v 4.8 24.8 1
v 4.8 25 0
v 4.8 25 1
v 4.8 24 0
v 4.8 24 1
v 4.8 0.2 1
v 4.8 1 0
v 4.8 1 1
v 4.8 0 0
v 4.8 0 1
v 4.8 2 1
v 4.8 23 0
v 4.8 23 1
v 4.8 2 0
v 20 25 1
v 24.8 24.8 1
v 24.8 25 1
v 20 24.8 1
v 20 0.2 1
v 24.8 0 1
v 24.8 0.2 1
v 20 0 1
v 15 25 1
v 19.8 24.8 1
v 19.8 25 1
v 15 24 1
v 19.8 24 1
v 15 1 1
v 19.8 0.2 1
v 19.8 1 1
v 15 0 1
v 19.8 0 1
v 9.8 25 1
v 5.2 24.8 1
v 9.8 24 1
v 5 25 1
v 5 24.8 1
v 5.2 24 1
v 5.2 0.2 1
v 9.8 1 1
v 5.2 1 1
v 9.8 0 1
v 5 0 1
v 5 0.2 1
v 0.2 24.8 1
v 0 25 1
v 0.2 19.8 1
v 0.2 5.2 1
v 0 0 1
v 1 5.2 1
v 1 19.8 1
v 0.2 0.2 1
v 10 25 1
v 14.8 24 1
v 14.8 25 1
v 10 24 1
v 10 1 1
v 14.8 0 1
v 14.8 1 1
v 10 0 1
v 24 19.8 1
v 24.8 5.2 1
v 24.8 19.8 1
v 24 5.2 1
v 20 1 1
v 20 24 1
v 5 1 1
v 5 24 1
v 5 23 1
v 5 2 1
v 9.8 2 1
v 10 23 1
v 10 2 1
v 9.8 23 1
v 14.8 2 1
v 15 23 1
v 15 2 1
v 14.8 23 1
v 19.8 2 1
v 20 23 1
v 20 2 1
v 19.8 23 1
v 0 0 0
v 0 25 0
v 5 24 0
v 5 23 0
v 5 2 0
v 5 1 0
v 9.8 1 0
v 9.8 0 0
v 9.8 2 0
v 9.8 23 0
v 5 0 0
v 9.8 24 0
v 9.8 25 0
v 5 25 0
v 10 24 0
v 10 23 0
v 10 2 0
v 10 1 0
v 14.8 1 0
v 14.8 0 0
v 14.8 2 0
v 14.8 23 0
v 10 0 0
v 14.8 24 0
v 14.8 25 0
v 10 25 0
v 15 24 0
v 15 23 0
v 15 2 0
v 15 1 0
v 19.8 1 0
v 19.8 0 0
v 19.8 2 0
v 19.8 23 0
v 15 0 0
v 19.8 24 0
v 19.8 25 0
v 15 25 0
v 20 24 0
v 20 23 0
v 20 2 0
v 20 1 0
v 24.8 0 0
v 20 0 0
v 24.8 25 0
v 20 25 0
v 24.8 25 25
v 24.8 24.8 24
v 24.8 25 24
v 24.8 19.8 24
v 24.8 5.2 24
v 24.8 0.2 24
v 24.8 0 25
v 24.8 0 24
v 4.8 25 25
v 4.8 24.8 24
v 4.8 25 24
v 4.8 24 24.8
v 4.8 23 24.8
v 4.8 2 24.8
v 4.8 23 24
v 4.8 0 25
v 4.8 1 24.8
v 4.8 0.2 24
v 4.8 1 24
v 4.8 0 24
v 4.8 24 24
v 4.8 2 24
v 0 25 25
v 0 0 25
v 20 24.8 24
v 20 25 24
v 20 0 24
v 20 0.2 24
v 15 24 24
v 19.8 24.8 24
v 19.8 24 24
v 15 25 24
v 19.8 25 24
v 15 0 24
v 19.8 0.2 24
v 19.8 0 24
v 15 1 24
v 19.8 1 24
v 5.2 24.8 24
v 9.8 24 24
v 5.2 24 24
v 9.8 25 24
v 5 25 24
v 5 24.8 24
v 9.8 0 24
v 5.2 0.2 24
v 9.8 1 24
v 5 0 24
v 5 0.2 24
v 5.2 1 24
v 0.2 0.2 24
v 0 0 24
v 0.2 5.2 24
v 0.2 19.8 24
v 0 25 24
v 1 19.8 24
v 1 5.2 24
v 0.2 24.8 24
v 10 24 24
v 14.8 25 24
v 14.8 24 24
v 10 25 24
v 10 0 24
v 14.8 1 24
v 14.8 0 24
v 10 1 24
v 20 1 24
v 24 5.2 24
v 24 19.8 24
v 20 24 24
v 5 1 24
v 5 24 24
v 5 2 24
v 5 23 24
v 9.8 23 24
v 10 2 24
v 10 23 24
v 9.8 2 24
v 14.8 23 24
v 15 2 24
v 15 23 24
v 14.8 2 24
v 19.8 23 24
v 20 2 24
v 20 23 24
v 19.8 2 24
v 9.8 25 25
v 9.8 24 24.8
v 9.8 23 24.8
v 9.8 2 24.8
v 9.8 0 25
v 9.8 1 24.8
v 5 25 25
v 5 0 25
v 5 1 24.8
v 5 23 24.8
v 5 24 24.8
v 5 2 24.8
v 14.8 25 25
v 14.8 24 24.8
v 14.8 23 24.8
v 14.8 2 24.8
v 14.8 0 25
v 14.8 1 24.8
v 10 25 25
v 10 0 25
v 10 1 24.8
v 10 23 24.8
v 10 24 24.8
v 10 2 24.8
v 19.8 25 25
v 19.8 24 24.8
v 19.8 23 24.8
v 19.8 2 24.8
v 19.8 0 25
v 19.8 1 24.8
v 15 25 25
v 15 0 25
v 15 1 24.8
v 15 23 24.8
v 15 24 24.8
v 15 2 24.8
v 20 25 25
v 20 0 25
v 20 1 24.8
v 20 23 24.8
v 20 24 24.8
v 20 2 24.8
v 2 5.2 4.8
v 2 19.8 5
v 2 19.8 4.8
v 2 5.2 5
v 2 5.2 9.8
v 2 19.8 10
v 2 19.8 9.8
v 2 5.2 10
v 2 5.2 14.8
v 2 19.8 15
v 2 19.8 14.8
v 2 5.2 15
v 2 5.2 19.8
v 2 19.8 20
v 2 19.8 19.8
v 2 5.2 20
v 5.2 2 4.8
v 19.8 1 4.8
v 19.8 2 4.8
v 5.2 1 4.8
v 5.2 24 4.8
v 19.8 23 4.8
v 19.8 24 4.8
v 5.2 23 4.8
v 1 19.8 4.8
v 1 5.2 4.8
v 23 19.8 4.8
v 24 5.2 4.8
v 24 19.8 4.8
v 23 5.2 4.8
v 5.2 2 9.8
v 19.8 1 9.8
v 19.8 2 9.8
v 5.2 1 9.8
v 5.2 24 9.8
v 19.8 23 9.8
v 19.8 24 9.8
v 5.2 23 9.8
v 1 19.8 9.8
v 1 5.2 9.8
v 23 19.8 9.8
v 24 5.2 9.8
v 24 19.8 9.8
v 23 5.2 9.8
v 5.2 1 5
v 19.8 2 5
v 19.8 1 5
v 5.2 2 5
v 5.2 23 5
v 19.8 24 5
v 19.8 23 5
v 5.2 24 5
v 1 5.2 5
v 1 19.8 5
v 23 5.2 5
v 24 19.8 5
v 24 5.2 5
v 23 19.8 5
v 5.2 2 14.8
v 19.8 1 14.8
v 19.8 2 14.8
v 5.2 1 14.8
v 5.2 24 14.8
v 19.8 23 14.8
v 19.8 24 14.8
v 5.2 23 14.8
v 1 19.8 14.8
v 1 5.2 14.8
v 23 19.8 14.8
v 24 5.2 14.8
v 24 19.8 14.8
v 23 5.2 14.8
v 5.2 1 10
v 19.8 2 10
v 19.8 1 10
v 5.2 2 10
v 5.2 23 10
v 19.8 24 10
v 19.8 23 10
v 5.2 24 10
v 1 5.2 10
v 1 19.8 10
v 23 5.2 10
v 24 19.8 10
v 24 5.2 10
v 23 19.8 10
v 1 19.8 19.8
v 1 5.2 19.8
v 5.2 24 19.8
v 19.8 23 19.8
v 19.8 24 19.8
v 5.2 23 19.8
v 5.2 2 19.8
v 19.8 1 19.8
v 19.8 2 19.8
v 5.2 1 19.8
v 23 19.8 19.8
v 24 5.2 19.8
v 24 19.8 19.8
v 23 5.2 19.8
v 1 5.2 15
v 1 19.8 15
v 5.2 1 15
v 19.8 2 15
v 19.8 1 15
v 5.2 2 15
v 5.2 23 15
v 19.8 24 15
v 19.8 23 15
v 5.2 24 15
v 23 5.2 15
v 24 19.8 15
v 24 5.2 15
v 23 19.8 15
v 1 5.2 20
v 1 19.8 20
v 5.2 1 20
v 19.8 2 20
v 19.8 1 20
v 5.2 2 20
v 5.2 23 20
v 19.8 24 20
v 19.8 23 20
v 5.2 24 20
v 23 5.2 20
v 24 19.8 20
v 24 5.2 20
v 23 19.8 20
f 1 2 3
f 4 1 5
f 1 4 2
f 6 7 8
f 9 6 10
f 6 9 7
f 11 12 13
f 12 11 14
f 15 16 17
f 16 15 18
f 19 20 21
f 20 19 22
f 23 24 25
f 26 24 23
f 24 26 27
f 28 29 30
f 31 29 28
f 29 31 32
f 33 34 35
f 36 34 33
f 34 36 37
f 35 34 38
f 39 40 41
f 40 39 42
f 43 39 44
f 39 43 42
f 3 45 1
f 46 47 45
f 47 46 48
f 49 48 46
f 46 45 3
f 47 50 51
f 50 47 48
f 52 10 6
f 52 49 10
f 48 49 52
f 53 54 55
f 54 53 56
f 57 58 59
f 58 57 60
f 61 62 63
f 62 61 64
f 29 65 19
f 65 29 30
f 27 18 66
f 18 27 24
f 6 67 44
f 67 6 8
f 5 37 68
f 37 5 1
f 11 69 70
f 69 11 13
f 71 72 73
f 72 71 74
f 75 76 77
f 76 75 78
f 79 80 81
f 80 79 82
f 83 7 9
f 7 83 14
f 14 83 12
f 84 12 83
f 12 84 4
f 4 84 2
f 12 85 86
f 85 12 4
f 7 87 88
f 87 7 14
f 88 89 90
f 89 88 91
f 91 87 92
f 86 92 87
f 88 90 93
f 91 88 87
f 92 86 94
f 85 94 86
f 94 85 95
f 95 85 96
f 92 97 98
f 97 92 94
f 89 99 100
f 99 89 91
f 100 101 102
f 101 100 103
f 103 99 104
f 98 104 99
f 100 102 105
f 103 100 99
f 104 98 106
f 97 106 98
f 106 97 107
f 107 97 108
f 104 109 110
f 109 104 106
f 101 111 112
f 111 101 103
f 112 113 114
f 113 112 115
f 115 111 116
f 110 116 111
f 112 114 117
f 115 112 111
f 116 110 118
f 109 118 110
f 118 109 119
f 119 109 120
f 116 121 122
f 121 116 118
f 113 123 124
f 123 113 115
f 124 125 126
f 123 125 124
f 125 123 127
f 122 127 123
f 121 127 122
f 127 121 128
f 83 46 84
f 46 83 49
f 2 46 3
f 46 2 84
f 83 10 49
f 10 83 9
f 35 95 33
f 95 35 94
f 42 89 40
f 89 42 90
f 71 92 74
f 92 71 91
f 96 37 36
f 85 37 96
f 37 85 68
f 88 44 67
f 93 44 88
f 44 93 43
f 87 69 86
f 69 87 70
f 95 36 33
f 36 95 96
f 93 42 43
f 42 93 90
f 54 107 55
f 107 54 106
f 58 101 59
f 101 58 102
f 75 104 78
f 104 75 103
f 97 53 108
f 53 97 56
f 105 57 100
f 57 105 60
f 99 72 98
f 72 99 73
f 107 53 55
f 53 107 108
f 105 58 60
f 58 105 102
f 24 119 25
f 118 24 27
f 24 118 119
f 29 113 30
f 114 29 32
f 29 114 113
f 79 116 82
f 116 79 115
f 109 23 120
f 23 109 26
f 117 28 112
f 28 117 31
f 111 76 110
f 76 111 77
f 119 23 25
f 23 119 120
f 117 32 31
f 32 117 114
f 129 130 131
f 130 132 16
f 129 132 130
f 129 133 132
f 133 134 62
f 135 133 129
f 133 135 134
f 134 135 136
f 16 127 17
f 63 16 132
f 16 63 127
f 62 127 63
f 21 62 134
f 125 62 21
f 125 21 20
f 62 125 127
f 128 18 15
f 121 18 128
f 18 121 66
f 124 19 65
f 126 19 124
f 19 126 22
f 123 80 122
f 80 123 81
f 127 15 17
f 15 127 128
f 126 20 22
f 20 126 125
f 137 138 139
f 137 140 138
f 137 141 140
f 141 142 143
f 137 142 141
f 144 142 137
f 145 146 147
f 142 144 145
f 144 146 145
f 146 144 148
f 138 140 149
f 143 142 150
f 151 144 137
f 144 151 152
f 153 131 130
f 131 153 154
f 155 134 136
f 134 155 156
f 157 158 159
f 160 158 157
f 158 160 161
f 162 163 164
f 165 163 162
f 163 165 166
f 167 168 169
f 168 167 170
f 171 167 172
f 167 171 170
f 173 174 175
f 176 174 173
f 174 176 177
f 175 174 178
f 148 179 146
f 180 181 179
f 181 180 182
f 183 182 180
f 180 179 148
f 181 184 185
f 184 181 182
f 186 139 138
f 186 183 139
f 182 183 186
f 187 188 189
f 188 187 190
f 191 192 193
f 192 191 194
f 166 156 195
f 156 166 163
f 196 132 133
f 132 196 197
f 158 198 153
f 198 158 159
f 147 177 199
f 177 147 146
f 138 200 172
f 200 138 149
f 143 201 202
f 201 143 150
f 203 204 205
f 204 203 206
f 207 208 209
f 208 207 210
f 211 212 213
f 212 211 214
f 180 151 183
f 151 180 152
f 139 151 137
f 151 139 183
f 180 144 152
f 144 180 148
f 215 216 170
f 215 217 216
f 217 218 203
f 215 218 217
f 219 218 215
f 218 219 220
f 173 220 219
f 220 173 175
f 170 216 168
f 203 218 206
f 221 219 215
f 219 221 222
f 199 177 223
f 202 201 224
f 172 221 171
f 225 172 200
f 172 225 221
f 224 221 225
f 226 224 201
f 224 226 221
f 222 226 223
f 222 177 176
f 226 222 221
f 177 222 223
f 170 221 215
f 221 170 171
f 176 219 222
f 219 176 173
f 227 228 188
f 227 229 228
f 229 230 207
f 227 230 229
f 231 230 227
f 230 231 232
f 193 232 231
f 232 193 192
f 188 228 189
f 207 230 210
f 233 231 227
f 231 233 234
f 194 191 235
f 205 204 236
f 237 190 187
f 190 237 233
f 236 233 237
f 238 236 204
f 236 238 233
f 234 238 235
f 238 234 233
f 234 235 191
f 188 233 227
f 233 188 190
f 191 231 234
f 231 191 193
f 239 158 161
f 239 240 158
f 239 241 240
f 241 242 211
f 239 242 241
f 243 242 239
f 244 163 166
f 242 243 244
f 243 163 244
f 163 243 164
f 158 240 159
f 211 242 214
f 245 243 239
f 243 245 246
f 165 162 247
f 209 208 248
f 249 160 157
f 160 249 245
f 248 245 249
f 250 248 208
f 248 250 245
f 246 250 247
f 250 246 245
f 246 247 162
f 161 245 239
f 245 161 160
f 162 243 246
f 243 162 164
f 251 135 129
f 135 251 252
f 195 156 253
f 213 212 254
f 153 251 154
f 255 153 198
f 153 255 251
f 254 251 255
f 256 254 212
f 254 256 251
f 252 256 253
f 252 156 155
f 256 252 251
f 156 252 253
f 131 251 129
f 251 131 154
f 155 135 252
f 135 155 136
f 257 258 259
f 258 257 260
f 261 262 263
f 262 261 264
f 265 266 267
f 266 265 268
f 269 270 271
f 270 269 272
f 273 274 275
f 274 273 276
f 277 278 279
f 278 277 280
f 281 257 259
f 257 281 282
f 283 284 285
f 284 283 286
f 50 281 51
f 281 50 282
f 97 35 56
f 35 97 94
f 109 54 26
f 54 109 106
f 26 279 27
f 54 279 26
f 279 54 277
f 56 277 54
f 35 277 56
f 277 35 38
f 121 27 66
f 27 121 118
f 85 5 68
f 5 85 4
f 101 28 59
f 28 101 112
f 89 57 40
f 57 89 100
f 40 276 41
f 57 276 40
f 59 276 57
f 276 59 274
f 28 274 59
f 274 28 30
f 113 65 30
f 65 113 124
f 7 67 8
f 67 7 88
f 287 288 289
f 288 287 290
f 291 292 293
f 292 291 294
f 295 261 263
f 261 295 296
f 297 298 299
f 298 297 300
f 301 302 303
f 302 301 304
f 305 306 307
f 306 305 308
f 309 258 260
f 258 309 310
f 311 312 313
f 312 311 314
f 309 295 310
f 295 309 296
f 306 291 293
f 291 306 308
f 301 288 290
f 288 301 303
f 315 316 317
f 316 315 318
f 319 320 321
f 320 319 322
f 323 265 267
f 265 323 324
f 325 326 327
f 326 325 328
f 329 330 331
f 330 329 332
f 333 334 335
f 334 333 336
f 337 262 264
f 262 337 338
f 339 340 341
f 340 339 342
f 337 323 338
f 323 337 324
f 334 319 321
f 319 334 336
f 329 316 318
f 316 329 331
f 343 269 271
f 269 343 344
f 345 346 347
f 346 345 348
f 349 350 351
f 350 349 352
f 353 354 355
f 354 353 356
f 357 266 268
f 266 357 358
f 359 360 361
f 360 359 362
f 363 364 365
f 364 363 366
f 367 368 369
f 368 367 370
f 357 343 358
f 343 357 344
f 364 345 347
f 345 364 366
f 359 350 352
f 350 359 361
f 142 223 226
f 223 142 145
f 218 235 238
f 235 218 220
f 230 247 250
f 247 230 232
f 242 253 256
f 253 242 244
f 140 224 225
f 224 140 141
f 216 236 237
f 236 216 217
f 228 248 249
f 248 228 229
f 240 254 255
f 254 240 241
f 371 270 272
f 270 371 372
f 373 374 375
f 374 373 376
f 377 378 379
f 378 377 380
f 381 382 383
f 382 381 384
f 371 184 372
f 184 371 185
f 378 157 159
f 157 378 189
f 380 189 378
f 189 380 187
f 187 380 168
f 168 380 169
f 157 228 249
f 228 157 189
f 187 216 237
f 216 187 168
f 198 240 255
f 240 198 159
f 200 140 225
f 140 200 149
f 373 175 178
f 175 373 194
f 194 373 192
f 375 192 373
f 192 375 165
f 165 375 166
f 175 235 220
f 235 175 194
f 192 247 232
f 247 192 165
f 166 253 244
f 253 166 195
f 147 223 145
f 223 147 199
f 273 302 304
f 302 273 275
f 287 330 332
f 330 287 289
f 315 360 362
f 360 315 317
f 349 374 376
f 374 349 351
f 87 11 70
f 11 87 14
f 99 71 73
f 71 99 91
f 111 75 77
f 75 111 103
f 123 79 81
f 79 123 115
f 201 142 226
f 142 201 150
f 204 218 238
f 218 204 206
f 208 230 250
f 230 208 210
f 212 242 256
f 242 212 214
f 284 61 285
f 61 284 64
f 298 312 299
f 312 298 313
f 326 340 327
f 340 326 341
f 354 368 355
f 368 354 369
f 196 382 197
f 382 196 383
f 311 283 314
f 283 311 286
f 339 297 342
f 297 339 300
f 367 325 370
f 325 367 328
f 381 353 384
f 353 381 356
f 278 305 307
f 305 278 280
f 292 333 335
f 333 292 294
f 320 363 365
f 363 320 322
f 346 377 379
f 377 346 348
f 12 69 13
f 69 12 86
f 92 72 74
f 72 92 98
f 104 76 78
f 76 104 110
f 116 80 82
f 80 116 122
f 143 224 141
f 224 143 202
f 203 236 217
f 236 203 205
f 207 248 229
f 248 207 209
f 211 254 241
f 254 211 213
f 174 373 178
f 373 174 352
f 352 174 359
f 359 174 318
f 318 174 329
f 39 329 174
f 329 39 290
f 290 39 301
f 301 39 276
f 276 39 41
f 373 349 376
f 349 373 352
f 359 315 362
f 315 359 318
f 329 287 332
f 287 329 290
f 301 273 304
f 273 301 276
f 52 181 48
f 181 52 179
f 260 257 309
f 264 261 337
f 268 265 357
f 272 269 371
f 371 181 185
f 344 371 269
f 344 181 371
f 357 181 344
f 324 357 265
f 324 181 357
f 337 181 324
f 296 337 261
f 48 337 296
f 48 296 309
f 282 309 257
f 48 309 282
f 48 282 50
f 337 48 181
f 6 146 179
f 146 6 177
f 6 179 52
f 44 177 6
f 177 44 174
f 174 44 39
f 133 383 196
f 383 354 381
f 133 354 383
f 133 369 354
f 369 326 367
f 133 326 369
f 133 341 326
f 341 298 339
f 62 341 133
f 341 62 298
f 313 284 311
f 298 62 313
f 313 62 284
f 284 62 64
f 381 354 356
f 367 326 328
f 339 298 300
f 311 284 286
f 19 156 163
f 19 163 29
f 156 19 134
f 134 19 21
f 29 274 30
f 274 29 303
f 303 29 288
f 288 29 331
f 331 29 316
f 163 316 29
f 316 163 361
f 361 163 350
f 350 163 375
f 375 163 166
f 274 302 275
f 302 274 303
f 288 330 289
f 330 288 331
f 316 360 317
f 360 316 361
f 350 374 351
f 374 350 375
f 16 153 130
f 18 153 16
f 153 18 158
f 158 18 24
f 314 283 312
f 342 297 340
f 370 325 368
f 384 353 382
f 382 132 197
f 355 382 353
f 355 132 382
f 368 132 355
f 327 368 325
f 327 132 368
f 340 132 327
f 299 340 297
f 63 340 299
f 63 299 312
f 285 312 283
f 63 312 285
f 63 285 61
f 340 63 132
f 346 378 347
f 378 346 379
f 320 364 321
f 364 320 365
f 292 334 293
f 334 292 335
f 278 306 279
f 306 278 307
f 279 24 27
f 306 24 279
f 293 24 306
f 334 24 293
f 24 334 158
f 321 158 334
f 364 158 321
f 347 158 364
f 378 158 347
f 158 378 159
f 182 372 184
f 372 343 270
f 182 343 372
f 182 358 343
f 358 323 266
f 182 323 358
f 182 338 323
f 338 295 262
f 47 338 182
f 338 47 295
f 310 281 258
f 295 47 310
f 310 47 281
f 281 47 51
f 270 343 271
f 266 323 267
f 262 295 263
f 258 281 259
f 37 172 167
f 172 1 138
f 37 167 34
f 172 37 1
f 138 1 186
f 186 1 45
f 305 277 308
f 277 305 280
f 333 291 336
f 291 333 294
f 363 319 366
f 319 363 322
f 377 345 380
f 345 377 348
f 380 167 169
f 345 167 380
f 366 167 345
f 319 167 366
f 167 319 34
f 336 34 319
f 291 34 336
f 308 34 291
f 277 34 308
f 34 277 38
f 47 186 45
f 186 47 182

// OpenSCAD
crate();
module crate(width = 25, height = 25, depth = 25, spars = 4) {
    spacing = 0.2;
    sparHeight = 1;
    sparWidth = width / (spars + 1);
    sparWidthWithSpacing = sparWidth - spacing;
    color([0.3,0.3,0.3])
    translate([sparHeight*2,sparHeight*2,sparHeight])
    cube([width-sparHeight*4, depth-sparHeight*4, height-sparHeight*2]);

    //Build top & bottom
    for(n = [0:1:1]) {
        translate([0,0,n * (height - sparHeight)])
        for(i = [0:1:spars]) {
            translate([i * sparWidth,0,0])
            cube([sparWidthWithSpacing, depth, sparHeight]);
        }
    }

    //Build sides
    translate([width / 2, depth / 2, 0])
    for(n = [0:1:4]) {
        rotate([0,0,n*90])
        translate([-width / 2, -depth / 2, 0])
        translate([sparHeight,sparHeight,0])
        for(i = [0:1:spars]) {
            translate([0,0,i * sparWidth])
            cube([sparHeight, depth - sparHeight * 2, sparWidthWithSpacing]);
        }
    }

    //Build corners
    translate([width / 2, depth / 2, 0])
    for(n = [0:1:4]) {
        rotate([0,0,n*90])
        translate([-width / 2, -depth / 2, 0])
        translate([spacing, spacing, sparHeight])
        cube([sparWidth, sparWidth, height - sparHeight * 2]);
    }
}
